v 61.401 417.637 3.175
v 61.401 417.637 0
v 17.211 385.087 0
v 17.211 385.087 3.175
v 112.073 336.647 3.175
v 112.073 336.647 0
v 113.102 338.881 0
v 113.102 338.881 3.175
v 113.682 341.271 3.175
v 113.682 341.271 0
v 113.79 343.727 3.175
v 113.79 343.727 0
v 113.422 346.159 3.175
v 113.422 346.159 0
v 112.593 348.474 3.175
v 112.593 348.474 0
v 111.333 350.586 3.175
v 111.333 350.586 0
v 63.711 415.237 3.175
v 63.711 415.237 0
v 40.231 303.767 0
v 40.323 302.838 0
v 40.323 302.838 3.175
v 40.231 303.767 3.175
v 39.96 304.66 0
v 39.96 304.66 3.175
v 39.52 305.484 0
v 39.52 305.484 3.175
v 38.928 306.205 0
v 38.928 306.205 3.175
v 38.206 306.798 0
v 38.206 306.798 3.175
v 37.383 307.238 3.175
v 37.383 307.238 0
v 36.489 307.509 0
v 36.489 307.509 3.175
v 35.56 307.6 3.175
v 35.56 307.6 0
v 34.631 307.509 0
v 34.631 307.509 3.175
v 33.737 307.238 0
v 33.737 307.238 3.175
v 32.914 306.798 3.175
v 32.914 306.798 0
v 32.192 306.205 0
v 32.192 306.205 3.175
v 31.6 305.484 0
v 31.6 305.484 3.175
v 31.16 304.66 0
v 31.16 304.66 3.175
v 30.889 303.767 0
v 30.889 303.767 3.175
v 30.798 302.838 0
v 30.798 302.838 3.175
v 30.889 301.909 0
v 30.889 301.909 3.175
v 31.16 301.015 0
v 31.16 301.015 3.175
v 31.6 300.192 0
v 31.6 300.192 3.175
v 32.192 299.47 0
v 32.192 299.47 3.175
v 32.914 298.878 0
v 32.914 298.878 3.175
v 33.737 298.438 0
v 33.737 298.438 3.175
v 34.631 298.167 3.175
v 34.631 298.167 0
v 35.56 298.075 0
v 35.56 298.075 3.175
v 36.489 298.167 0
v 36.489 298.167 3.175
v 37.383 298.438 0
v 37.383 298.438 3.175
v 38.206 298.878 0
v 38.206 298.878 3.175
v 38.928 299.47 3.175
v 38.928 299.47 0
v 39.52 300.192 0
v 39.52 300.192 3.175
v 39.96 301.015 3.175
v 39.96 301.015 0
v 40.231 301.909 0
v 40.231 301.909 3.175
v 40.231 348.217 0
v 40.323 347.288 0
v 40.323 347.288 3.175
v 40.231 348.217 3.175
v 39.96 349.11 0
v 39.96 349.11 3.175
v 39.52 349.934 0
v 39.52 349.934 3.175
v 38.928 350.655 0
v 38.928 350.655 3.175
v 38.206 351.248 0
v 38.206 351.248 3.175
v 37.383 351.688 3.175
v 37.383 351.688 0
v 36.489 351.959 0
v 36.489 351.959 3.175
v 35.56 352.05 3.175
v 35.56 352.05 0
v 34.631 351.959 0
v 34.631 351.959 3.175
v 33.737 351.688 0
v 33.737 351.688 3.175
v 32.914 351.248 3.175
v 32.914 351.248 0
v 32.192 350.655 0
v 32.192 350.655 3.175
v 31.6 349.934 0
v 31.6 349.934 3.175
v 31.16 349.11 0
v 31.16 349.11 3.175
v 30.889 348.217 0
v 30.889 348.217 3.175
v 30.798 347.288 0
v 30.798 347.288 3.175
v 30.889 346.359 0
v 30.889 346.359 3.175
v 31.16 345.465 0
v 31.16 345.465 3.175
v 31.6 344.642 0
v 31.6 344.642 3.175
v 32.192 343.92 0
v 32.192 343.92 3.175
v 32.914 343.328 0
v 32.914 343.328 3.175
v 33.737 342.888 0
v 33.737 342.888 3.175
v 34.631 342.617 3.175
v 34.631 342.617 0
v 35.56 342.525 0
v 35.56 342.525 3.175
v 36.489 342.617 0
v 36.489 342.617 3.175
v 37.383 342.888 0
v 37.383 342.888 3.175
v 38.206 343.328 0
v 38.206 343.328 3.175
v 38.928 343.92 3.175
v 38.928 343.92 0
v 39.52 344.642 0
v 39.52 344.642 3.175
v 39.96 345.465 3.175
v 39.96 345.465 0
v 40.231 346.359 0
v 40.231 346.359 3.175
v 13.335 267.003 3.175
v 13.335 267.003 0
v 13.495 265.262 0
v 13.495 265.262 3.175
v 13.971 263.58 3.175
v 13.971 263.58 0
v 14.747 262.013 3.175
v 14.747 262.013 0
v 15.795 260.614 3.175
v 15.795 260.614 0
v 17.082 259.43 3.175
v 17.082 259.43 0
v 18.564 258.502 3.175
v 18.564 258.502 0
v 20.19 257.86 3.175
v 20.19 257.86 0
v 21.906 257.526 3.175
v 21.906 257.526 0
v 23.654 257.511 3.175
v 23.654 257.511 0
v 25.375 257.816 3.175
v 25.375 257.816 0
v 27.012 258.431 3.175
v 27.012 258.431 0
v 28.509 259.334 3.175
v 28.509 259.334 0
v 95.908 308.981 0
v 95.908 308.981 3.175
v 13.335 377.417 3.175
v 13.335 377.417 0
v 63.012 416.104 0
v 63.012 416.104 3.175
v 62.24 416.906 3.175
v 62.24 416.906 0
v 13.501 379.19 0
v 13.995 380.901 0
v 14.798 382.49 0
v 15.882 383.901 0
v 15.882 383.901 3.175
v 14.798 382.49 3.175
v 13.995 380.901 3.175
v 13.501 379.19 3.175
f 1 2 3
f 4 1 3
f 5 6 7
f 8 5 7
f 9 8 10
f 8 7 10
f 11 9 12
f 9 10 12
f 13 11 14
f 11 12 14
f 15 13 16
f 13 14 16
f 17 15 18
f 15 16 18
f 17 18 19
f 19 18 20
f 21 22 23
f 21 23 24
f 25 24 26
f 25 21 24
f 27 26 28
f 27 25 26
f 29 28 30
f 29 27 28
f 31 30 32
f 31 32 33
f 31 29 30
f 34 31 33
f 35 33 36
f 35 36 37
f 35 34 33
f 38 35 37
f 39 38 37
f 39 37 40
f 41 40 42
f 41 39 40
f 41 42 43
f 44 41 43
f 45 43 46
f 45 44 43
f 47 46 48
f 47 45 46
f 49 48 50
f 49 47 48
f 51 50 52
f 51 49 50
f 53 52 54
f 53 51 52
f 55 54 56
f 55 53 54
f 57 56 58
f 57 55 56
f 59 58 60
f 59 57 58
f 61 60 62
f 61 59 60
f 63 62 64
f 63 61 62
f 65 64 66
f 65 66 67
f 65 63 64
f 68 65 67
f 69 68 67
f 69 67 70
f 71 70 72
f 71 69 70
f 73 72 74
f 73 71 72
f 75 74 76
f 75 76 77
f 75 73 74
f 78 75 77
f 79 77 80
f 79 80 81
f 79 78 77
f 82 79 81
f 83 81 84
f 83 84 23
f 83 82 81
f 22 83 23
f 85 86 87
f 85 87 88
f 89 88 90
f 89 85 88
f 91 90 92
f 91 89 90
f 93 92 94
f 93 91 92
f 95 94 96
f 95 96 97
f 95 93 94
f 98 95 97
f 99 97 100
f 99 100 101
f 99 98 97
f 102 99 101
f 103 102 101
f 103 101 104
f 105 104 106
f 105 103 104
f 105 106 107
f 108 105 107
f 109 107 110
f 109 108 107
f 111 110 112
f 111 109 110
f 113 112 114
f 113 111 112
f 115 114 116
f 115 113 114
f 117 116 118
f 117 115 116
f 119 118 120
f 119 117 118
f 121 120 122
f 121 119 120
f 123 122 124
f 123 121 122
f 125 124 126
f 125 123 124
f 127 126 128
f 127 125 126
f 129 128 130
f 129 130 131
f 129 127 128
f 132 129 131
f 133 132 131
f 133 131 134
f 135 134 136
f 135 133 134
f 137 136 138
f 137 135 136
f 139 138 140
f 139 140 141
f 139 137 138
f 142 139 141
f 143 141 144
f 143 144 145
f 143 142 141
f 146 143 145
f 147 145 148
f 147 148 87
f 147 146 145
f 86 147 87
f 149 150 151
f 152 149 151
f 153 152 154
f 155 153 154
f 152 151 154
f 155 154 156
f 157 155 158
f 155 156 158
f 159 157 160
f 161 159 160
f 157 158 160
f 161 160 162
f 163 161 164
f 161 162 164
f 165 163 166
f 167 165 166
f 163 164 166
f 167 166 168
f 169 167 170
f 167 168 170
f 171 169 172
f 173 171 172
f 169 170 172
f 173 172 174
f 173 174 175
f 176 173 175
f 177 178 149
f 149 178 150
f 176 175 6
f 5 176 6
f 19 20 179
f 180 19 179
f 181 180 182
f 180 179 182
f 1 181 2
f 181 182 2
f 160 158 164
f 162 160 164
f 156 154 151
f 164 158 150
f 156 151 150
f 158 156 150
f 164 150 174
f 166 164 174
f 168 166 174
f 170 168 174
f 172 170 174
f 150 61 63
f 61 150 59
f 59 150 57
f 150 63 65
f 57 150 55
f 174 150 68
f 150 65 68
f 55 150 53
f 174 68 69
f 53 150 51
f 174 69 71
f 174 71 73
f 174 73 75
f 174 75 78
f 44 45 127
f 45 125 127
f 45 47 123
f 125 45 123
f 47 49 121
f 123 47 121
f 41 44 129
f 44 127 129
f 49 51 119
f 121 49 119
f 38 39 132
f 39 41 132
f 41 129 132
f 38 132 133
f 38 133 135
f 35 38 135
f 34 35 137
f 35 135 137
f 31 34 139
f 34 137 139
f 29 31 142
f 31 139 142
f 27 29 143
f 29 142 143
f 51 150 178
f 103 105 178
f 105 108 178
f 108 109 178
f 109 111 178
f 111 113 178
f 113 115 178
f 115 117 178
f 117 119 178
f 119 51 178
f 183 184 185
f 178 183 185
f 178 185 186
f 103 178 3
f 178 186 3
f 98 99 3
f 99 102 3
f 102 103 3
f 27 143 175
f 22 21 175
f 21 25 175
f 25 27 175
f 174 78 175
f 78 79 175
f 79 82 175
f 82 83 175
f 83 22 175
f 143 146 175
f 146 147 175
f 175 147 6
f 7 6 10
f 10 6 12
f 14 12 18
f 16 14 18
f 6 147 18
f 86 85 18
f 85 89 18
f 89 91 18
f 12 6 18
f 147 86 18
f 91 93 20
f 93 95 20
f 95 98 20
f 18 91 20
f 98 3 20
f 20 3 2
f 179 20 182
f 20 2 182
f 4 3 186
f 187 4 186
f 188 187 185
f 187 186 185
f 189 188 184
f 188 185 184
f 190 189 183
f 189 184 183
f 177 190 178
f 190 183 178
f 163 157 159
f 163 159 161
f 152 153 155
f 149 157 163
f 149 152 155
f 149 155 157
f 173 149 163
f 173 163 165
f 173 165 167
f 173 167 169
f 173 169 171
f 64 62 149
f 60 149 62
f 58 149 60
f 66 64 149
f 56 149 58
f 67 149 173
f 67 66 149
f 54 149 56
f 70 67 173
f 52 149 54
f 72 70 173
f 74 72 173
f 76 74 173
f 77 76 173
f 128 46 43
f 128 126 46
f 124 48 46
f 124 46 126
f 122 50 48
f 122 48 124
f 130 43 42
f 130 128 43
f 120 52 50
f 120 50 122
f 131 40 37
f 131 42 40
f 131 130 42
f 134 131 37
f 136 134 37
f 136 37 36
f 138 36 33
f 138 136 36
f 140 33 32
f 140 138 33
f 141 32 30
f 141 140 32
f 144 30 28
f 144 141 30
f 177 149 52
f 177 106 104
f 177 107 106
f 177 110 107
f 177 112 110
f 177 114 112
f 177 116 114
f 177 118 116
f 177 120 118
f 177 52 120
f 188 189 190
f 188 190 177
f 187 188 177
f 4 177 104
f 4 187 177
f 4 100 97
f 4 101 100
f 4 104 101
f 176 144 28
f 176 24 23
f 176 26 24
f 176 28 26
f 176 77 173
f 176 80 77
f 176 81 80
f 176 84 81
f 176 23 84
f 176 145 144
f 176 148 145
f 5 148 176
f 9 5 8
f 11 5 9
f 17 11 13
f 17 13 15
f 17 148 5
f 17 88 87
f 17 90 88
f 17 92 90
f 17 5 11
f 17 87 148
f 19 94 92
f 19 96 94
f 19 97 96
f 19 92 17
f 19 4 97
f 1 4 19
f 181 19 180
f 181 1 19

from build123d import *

# Parameters (mm, degrees)
SKETCH1_R           = 4.7625
BOSS_EXTRUDE1_DEPTH = 3.175


with BuildPart() as part:
    # Sketch1 → Boss-Extrude1 (new body)
    with BuildSketch(Plane.XY):
        with BuildLine():
            Line((111.332808166, 350.586079181), (63.710529936, 415.237184501))
            ThreePointArc((63.710529936, 415.237184501), (62.634536999, 416.513021087), (61.400531956, 417.636743182))
            Line((61.400531956, 417.636743182), (17.210961523, 385.086518286))
            ThreePointArc((17.210961523, 385.086518286), (14.359037805, 381.713915243), (13.335, 377.417490362))
            Line((13.335, 377.417490362), (13.335, 267.002909993))
            ThreePointArc((13.335, 267.002909993), (18.563575119, 258.501947797), (28.509038477, 259.333882069))
            Line((28.509038477, 259.333882069), (95.90843461, 308.980562961))
            Line((95.90843461, 308.980562961), (112.073002649, 336.647282747))
            ThreePointArc((112.073002649, 336.647282747), (113.789568713, 343.727489431), (111.332808166, 350.586079181))
        make_face()
        with Locations((35.56, 302.837639338)):
            Circle(SKETCH1_R, mode=Mode.SUBTRACT)
        with Locations((35.56, 347.287639338)):
            Circle(SKETCH1_R, mode=Mode.SUBTRACT)
    extrude(amount=BOSS_EXTRUDE1_DEPTH)


solid = part.part
